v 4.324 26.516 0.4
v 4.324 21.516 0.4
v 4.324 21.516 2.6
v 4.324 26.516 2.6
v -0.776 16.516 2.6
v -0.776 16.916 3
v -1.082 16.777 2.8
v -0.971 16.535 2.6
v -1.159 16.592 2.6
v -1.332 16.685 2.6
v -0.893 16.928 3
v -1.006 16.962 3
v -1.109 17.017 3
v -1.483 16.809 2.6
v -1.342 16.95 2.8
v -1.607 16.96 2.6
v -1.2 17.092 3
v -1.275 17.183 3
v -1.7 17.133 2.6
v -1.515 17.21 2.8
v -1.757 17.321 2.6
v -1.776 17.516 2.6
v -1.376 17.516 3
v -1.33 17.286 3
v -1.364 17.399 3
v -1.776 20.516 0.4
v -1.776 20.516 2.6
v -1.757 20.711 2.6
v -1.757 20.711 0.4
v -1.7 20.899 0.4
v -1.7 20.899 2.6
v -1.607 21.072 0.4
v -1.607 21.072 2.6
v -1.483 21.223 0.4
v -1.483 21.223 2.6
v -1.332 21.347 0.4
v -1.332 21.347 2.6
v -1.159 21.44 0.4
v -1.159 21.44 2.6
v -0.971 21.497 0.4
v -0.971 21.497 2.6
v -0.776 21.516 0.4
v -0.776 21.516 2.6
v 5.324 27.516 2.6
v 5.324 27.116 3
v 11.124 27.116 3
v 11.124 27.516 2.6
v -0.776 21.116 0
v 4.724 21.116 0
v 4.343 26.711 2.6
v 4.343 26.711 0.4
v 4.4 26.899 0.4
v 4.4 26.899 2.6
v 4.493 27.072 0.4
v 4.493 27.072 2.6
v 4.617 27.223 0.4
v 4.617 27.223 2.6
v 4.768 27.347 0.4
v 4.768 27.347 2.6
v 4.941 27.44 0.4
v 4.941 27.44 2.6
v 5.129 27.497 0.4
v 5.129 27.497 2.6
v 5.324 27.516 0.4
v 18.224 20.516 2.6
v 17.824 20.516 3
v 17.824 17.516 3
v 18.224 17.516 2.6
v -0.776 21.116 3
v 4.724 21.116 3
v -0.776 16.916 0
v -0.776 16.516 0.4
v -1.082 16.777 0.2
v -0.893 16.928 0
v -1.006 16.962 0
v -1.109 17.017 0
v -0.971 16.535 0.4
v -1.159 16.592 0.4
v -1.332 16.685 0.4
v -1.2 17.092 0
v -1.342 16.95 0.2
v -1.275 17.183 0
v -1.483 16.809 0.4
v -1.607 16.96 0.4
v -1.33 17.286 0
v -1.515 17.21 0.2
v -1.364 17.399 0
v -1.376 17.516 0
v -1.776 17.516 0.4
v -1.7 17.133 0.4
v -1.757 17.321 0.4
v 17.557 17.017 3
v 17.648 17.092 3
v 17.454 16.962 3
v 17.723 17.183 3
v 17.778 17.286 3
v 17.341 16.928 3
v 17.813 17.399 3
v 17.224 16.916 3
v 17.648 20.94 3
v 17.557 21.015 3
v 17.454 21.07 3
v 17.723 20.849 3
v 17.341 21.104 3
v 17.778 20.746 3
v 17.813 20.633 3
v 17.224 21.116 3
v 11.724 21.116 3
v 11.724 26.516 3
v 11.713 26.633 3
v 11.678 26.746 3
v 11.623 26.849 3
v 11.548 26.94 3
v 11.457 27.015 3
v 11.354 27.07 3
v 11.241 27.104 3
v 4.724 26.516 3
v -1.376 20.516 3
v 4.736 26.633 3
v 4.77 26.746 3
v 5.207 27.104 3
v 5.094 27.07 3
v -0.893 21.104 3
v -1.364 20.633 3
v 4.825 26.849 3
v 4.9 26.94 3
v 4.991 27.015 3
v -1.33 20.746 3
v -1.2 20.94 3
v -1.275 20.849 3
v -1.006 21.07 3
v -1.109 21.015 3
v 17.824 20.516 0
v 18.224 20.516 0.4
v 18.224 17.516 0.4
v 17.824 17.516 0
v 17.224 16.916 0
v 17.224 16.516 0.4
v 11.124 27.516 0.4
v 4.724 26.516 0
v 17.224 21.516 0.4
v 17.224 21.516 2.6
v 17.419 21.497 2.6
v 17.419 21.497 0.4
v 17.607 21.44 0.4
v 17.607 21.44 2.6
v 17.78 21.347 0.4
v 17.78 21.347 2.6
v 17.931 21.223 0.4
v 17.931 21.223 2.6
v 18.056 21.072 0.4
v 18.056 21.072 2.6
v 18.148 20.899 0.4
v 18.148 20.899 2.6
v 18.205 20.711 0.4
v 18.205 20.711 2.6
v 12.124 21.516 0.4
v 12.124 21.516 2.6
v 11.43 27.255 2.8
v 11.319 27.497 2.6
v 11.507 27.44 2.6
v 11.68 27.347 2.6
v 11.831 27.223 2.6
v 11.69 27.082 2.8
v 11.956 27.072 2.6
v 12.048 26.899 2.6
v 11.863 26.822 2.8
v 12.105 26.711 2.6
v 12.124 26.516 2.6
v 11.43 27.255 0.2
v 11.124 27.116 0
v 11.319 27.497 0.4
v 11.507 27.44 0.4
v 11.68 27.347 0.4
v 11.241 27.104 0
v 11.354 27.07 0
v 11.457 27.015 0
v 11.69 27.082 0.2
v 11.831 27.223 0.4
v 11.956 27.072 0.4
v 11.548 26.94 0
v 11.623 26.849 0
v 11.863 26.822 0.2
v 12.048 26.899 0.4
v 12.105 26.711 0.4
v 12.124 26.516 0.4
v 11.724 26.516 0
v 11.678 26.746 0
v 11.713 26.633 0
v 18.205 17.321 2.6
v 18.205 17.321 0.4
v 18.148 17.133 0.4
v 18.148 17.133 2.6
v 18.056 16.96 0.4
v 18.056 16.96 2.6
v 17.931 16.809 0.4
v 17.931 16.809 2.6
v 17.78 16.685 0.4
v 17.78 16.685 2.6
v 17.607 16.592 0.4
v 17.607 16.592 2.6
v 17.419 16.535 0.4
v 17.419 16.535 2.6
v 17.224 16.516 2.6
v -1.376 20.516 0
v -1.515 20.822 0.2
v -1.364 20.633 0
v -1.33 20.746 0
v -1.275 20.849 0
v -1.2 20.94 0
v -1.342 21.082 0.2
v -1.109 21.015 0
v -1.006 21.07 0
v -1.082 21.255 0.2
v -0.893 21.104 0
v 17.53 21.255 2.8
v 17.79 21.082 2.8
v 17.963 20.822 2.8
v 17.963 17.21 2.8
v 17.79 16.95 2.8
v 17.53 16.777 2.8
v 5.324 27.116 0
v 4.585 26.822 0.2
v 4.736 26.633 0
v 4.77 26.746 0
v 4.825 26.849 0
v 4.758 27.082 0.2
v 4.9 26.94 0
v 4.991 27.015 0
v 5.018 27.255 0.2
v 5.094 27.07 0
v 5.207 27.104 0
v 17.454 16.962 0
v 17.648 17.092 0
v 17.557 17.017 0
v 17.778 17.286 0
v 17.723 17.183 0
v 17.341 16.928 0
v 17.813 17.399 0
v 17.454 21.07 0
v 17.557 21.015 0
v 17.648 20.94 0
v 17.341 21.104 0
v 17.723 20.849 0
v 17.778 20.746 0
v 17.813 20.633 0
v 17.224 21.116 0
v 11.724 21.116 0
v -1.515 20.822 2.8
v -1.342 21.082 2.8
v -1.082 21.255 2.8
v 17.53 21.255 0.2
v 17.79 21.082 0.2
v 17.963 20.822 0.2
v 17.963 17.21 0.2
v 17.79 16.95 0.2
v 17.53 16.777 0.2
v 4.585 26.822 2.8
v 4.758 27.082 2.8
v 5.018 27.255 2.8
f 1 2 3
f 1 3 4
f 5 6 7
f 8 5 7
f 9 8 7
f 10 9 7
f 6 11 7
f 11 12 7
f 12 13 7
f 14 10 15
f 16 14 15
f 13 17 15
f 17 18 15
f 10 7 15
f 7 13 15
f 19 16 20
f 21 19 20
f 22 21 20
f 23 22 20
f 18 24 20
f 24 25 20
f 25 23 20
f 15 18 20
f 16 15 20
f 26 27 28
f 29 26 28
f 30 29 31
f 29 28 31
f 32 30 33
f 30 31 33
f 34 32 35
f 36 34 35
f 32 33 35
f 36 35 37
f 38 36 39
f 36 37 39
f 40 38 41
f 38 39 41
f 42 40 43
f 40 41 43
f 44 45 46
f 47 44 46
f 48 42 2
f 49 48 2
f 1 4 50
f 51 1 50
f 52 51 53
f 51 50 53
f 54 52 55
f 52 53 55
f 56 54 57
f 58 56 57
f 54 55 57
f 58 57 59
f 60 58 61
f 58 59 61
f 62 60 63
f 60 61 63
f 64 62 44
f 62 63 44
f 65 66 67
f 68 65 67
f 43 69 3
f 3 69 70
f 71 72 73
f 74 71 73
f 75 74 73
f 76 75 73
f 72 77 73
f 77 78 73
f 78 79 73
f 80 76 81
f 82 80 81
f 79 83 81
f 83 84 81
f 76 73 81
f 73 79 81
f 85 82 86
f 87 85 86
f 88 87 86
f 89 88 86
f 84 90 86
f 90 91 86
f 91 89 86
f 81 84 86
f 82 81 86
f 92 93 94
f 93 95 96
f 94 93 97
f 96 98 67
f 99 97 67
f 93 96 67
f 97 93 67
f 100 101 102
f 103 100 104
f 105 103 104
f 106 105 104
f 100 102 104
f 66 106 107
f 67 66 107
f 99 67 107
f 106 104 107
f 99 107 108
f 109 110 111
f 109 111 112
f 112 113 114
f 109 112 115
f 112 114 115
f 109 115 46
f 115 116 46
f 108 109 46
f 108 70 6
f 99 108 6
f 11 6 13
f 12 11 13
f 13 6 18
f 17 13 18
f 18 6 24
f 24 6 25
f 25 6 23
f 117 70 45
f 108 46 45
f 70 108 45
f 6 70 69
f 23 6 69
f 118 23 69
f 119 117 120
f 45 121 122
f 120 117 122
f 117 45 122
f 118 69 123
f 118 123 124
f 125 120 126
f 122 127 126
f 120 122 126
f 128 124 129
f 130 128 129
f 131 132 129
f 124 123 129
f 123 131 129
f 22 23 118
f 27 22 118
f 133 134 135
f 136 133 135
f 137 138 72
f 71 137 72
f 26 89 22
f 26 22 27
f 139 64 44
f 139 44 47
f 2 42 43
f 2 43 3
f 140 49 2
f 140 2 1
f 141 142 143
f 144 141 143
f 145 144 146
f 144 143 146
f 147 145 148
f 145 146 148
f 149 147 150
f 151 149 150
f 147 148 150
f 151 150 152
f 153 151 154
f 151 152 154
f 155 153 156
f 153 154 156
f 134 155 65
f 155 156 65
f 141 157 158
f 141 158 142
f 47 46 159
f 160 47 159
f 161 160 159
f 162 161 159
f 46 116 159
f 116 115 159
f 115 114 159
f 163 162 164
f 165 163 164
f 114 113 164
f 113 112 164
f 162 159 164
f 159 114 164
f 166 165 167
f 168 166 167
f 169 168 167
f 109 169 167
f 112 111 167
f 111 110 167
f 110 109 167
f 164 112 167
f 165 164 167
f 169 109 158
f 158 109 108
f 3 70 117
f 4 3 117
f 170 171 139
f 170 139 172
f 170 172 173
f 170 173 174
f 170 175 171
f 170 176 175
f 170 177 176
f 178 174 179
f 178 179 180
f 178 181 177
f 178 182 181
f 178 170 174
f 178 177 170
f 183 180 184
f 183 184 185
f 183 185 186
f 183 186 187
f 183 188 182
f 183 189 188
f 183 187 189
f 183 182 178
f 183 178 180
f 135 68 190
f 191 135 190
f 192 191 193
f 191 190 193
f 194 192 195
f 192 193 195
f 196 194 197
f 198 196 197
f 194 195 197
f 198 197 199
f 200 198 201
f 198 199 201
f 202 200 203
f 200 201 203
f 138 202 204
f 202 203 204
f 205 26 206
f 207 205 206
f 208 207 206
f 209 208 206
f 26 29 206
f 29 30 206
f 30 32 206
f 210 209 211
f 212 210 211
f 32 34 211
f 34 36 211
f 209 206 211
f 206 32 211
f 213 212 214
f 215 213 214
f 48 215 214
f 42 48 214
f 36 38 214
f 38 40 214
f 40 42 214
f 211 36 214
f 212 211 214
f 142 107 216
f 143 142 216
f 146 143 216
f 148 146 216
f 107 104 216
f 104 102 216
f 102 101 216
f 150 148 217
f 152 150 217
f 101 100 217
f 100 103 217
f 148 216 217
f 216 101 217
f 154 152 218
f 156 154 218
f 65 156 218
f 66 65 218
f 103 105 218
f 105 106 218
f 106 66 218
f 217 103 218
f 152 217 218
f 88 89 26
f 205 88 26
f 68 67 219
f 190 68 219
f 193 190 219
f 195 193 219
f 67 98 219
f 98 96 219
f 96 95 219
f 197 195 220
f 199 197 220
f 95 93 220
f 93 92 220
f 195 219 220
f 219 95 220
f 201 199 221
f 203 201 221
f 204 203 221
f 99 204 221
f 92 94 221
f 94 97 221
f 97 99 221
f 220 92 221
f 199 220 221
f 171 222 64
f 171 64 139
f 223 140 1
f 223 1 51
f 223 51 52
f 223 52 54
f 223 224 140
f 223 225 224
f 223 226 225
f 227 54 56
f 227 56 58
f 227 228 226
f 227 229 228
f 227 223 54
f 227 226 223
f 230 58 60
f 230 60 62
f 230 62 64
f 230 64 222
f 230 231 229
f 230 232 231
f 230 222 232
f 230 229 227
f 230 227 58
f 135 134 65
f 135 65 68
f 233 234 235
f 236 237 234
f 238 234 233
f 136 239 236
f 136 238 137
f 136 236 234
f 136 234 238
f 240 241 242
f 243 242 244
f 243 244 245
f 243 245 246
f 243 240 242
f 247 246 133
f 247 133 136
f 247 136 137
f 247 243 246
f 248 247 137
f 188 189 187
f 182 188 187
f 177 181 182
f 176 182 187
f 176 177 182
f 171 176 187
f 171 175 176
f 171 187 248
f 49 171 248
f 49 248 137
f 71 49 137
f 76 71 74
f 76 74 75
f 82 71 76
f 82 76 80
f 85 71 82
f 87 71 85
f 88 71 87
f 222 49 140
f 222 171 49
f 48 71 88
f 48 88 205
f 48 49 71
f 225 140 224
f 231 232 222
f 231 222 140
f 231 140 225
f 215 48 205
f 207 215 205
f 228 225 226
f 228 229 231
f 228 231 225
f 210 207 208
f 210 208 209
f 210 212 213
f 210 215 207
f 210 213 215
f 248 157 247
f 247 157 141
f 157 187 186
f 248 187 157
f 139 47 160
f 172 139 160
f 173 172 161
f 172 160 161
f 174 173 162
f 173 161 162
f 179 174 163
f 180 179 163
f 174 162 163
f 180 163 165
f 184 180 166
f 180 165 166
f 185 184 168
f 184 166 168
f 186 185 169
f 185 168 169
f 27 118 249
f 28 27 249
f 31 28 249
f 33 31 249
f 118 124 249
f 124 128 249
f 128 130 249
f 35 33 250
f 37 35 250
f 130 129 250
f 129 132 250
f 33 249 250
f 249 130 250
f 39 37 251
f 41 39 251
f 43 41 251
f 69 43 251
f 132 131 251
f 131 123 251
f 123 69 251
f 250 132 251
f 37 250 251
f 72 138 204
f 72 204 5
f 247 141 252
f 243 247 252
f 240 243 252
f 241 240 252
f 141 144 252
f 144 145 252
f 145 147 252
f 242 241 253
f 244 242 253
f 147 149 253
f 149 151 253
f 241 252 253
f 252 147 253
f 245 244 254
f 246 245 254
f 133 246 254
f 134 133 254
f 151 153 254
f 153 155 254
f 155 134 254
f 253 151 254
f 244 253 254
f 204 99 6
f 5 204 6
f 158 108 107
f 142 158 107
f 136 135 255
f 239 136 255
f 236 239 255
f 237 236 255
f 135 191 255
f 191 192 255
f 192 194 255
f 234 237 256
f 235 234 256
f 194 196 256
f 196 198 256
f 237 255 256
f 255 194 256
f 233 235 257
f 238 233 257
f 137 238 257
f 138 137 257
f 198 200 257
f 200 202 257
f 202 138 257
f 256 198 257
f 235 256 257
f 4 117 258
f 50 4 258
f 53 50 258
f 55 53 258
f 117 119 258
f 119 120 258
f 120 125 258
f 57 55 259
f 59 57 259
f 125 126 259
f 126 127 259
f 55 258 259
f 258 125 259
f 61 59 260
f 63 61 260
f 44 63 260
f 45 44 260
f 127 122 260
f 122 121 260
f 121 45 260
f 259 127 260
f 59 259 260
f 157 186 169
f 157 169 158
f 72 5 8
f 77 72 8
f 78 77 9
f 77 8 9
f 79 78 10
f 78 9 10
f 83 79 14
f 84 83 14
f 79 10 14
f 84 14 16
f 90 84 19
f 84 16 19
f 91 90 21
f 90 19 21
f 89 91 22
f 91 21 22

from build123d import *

# Parameters (mm, degrees)
PAD_DEPTH    = 3
FILLET_R     = 1
CHAMFER_SIZE = 0.4


with BuildPart() as part:
    # Sketch → Pad (new body)
    with BuildSketch(Plane.XY):
        Polygon((4.324051, 21.515991), (4.324051, 27.515991), (12.124051, 27.515991), (12.124051, 21.515991), (18.224051, 21.515991), (18.224051, 16.515991), (-1.775949, 16.515991), (-1.775949, 21.515991), align=None)
    extrude(amount=PAD_DEPTH)

    # Fillet
    fillet_edges = [part.edges().sort_by_distance(p)[0] for p in [
        (18.224051, 21.515991, 1.5),
        (12.124051, 27.515991, 1.5),
        (4.324051, 27.515991, 1.5),
        (18.224051, 16.515991, 1.5),
        (-1.775949, 21.515991, 1.5),
        (-1.775949, 16.515991, 1.5),
    ]]
    fillet(fillet_edges, radius=FILLET_R)

    # Chamfer
    chamfer_edges = [part.edges().sort_by_distance(p)[0] for p in [
        (4.324051, 24.015991, 3),
        (4.616944, 27.223098, 3),
        (1.774051, 21.515991, 3),
        (8.224051, 27.515991, 3),
        (-1.483056, 21.223098, 3),
        (11.831158, 27.223098, 3),
        (-1.775949, 19.015991, 3),
        (12.124051, 24.015991, 3),
        (-1.483056, 16.808884, 3),
        (14.674051, 21.515991, 3),
        (8.224051, 16.515991, 3),
        (17.931158, 21.223098, 3),
        (17.931158, 16.808884, 3),
        (18.224051, 19.015991, 3),
        (4.324051, 24.015991, 0),
        (4.616944, 27.223098, 0),
        (1.774051, 21.515991, 0),
        (8.224051, 27.515991, 0),
        (-1.483056, 21.223098, 0),
        (11.831158, 27.223098, 0),
        (-1.775949, 19.015991, 0),
        (12.124051, 24.015991, 0),
        (-1.483056, 16.808884, 0),
        (14.674051, 21.515991, 0),
        (8.224051, 16.515991, 0),
        (17.931158, 21.223098, 0),
        (17.931158, 16.808884, 0),
        (18.224051, 19.015991, 0),
    ]]
    chamfer(chamfer_edges, length=CHAMFER_SIZE)


solid = part.part
